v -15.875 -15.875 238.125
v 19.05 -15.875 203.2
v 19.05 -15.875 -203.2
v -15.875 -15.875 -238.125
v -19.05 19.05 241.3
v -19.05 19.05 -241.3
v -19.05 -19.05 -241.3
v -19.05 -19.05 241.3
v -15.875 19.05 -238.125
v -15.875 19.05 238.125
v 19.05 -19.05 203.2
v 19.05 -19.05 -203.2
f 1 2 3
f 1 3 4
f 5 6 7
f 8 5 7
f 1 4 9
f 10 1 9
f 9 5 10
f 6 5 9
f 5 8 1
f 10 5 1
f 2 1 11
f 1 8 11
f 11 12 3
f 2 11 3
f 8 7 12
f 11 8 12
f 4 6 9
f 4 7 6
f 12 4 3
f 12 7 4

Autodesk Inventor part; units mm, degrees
ref_plane "YZ Plane" through (0, 0, 0) normal (1, 0, 0) x (0, 1, 0)
ref_plane "XZ Plane" through (0, 0, 0) normal (0, 1, 0) x (-1, 0, 0)
ref_plane "XY Plane" through (0, 0, 0) normal (0, 0, 1) x (1, 0, 0)
sketch "Sketch1" plane through (0, 0, 0) normal (0, 0, 1) x (1, 0, 0)
  line L0 (-26.67, 0) -> (26.67, 0) projected
  line L1 (0, -26.67) -> (0, 26.67) projected
  line L2 (-19.05, 19.05) -> (-19.05, -19.05)
  line L3 (-19.05, -19.05) -> (19.05, -19.05)
  line L4 (19.05, -15.875) -> (-15.875, -15.875)
  line L5 (-15.875, -15.875) -> (-15.875, 19.05)
  line L6 (-19.05, 19.05) -> (-15.875, 19.05)
  line L7 (19.05, -19.05) -> (19.05, -15.875)
  point P0 (0, 0)
  point P1 (-19.05, 0)
  point P2 (0, -19.05)
  dimension "d0" = 38.1
  dimension "d1" = 3.175
extrude "Extrusion1" add sketch "Sketch1" along normal mid plane 482.6 contours L2 L6 L5 L0 | L0 L5 L4 L1 L3 L2 | L1 L4 L7 L3
sketch "Sketch2" plane through (-15.875, -15.875, 241.3) normal (0, 1, 0) x (1, 0, 0)
  line L0 (0, 0) -> (34.925, 0) projected
  line L1 (34.925, 482.6) -> (34.925, 0) projected
  line L2 (0, 482.6) -> (0, 0) projected
  line L3 (-3.175, 0) -> (-3.175, 482.6) projected
  line L4 (-3.175, 0) -> (34.925, 38.1)
  line L5 (34.925, 241.3) -> (0, 241.3) construction
  line L6 (-3.175, 482.6) -> (34.925, 444.5)
  line L7 (-3.175, 482.6) -> (34.925, 482.6)
  line L8 (34.925, 482.6) -> (34.925, 444.5)
  line L9 (-3.175, 0) -> (34.925, 0)
  line L10 (34.925, 0) -> (34.925, 38.1)
  point P0 (15.875, 241.3)
  dimension "d4" = 45
extrude "Extrusion2" cut sketch "Sketch2" along normal through all both and the other way through all contours L2 L4 L1 L0 | L9 L4 L2 | L6 L7 L2 | L2 L7 L1 L6
properties part number "angle template al-6061 1x1x0.125" material "Aluminum-6061"
